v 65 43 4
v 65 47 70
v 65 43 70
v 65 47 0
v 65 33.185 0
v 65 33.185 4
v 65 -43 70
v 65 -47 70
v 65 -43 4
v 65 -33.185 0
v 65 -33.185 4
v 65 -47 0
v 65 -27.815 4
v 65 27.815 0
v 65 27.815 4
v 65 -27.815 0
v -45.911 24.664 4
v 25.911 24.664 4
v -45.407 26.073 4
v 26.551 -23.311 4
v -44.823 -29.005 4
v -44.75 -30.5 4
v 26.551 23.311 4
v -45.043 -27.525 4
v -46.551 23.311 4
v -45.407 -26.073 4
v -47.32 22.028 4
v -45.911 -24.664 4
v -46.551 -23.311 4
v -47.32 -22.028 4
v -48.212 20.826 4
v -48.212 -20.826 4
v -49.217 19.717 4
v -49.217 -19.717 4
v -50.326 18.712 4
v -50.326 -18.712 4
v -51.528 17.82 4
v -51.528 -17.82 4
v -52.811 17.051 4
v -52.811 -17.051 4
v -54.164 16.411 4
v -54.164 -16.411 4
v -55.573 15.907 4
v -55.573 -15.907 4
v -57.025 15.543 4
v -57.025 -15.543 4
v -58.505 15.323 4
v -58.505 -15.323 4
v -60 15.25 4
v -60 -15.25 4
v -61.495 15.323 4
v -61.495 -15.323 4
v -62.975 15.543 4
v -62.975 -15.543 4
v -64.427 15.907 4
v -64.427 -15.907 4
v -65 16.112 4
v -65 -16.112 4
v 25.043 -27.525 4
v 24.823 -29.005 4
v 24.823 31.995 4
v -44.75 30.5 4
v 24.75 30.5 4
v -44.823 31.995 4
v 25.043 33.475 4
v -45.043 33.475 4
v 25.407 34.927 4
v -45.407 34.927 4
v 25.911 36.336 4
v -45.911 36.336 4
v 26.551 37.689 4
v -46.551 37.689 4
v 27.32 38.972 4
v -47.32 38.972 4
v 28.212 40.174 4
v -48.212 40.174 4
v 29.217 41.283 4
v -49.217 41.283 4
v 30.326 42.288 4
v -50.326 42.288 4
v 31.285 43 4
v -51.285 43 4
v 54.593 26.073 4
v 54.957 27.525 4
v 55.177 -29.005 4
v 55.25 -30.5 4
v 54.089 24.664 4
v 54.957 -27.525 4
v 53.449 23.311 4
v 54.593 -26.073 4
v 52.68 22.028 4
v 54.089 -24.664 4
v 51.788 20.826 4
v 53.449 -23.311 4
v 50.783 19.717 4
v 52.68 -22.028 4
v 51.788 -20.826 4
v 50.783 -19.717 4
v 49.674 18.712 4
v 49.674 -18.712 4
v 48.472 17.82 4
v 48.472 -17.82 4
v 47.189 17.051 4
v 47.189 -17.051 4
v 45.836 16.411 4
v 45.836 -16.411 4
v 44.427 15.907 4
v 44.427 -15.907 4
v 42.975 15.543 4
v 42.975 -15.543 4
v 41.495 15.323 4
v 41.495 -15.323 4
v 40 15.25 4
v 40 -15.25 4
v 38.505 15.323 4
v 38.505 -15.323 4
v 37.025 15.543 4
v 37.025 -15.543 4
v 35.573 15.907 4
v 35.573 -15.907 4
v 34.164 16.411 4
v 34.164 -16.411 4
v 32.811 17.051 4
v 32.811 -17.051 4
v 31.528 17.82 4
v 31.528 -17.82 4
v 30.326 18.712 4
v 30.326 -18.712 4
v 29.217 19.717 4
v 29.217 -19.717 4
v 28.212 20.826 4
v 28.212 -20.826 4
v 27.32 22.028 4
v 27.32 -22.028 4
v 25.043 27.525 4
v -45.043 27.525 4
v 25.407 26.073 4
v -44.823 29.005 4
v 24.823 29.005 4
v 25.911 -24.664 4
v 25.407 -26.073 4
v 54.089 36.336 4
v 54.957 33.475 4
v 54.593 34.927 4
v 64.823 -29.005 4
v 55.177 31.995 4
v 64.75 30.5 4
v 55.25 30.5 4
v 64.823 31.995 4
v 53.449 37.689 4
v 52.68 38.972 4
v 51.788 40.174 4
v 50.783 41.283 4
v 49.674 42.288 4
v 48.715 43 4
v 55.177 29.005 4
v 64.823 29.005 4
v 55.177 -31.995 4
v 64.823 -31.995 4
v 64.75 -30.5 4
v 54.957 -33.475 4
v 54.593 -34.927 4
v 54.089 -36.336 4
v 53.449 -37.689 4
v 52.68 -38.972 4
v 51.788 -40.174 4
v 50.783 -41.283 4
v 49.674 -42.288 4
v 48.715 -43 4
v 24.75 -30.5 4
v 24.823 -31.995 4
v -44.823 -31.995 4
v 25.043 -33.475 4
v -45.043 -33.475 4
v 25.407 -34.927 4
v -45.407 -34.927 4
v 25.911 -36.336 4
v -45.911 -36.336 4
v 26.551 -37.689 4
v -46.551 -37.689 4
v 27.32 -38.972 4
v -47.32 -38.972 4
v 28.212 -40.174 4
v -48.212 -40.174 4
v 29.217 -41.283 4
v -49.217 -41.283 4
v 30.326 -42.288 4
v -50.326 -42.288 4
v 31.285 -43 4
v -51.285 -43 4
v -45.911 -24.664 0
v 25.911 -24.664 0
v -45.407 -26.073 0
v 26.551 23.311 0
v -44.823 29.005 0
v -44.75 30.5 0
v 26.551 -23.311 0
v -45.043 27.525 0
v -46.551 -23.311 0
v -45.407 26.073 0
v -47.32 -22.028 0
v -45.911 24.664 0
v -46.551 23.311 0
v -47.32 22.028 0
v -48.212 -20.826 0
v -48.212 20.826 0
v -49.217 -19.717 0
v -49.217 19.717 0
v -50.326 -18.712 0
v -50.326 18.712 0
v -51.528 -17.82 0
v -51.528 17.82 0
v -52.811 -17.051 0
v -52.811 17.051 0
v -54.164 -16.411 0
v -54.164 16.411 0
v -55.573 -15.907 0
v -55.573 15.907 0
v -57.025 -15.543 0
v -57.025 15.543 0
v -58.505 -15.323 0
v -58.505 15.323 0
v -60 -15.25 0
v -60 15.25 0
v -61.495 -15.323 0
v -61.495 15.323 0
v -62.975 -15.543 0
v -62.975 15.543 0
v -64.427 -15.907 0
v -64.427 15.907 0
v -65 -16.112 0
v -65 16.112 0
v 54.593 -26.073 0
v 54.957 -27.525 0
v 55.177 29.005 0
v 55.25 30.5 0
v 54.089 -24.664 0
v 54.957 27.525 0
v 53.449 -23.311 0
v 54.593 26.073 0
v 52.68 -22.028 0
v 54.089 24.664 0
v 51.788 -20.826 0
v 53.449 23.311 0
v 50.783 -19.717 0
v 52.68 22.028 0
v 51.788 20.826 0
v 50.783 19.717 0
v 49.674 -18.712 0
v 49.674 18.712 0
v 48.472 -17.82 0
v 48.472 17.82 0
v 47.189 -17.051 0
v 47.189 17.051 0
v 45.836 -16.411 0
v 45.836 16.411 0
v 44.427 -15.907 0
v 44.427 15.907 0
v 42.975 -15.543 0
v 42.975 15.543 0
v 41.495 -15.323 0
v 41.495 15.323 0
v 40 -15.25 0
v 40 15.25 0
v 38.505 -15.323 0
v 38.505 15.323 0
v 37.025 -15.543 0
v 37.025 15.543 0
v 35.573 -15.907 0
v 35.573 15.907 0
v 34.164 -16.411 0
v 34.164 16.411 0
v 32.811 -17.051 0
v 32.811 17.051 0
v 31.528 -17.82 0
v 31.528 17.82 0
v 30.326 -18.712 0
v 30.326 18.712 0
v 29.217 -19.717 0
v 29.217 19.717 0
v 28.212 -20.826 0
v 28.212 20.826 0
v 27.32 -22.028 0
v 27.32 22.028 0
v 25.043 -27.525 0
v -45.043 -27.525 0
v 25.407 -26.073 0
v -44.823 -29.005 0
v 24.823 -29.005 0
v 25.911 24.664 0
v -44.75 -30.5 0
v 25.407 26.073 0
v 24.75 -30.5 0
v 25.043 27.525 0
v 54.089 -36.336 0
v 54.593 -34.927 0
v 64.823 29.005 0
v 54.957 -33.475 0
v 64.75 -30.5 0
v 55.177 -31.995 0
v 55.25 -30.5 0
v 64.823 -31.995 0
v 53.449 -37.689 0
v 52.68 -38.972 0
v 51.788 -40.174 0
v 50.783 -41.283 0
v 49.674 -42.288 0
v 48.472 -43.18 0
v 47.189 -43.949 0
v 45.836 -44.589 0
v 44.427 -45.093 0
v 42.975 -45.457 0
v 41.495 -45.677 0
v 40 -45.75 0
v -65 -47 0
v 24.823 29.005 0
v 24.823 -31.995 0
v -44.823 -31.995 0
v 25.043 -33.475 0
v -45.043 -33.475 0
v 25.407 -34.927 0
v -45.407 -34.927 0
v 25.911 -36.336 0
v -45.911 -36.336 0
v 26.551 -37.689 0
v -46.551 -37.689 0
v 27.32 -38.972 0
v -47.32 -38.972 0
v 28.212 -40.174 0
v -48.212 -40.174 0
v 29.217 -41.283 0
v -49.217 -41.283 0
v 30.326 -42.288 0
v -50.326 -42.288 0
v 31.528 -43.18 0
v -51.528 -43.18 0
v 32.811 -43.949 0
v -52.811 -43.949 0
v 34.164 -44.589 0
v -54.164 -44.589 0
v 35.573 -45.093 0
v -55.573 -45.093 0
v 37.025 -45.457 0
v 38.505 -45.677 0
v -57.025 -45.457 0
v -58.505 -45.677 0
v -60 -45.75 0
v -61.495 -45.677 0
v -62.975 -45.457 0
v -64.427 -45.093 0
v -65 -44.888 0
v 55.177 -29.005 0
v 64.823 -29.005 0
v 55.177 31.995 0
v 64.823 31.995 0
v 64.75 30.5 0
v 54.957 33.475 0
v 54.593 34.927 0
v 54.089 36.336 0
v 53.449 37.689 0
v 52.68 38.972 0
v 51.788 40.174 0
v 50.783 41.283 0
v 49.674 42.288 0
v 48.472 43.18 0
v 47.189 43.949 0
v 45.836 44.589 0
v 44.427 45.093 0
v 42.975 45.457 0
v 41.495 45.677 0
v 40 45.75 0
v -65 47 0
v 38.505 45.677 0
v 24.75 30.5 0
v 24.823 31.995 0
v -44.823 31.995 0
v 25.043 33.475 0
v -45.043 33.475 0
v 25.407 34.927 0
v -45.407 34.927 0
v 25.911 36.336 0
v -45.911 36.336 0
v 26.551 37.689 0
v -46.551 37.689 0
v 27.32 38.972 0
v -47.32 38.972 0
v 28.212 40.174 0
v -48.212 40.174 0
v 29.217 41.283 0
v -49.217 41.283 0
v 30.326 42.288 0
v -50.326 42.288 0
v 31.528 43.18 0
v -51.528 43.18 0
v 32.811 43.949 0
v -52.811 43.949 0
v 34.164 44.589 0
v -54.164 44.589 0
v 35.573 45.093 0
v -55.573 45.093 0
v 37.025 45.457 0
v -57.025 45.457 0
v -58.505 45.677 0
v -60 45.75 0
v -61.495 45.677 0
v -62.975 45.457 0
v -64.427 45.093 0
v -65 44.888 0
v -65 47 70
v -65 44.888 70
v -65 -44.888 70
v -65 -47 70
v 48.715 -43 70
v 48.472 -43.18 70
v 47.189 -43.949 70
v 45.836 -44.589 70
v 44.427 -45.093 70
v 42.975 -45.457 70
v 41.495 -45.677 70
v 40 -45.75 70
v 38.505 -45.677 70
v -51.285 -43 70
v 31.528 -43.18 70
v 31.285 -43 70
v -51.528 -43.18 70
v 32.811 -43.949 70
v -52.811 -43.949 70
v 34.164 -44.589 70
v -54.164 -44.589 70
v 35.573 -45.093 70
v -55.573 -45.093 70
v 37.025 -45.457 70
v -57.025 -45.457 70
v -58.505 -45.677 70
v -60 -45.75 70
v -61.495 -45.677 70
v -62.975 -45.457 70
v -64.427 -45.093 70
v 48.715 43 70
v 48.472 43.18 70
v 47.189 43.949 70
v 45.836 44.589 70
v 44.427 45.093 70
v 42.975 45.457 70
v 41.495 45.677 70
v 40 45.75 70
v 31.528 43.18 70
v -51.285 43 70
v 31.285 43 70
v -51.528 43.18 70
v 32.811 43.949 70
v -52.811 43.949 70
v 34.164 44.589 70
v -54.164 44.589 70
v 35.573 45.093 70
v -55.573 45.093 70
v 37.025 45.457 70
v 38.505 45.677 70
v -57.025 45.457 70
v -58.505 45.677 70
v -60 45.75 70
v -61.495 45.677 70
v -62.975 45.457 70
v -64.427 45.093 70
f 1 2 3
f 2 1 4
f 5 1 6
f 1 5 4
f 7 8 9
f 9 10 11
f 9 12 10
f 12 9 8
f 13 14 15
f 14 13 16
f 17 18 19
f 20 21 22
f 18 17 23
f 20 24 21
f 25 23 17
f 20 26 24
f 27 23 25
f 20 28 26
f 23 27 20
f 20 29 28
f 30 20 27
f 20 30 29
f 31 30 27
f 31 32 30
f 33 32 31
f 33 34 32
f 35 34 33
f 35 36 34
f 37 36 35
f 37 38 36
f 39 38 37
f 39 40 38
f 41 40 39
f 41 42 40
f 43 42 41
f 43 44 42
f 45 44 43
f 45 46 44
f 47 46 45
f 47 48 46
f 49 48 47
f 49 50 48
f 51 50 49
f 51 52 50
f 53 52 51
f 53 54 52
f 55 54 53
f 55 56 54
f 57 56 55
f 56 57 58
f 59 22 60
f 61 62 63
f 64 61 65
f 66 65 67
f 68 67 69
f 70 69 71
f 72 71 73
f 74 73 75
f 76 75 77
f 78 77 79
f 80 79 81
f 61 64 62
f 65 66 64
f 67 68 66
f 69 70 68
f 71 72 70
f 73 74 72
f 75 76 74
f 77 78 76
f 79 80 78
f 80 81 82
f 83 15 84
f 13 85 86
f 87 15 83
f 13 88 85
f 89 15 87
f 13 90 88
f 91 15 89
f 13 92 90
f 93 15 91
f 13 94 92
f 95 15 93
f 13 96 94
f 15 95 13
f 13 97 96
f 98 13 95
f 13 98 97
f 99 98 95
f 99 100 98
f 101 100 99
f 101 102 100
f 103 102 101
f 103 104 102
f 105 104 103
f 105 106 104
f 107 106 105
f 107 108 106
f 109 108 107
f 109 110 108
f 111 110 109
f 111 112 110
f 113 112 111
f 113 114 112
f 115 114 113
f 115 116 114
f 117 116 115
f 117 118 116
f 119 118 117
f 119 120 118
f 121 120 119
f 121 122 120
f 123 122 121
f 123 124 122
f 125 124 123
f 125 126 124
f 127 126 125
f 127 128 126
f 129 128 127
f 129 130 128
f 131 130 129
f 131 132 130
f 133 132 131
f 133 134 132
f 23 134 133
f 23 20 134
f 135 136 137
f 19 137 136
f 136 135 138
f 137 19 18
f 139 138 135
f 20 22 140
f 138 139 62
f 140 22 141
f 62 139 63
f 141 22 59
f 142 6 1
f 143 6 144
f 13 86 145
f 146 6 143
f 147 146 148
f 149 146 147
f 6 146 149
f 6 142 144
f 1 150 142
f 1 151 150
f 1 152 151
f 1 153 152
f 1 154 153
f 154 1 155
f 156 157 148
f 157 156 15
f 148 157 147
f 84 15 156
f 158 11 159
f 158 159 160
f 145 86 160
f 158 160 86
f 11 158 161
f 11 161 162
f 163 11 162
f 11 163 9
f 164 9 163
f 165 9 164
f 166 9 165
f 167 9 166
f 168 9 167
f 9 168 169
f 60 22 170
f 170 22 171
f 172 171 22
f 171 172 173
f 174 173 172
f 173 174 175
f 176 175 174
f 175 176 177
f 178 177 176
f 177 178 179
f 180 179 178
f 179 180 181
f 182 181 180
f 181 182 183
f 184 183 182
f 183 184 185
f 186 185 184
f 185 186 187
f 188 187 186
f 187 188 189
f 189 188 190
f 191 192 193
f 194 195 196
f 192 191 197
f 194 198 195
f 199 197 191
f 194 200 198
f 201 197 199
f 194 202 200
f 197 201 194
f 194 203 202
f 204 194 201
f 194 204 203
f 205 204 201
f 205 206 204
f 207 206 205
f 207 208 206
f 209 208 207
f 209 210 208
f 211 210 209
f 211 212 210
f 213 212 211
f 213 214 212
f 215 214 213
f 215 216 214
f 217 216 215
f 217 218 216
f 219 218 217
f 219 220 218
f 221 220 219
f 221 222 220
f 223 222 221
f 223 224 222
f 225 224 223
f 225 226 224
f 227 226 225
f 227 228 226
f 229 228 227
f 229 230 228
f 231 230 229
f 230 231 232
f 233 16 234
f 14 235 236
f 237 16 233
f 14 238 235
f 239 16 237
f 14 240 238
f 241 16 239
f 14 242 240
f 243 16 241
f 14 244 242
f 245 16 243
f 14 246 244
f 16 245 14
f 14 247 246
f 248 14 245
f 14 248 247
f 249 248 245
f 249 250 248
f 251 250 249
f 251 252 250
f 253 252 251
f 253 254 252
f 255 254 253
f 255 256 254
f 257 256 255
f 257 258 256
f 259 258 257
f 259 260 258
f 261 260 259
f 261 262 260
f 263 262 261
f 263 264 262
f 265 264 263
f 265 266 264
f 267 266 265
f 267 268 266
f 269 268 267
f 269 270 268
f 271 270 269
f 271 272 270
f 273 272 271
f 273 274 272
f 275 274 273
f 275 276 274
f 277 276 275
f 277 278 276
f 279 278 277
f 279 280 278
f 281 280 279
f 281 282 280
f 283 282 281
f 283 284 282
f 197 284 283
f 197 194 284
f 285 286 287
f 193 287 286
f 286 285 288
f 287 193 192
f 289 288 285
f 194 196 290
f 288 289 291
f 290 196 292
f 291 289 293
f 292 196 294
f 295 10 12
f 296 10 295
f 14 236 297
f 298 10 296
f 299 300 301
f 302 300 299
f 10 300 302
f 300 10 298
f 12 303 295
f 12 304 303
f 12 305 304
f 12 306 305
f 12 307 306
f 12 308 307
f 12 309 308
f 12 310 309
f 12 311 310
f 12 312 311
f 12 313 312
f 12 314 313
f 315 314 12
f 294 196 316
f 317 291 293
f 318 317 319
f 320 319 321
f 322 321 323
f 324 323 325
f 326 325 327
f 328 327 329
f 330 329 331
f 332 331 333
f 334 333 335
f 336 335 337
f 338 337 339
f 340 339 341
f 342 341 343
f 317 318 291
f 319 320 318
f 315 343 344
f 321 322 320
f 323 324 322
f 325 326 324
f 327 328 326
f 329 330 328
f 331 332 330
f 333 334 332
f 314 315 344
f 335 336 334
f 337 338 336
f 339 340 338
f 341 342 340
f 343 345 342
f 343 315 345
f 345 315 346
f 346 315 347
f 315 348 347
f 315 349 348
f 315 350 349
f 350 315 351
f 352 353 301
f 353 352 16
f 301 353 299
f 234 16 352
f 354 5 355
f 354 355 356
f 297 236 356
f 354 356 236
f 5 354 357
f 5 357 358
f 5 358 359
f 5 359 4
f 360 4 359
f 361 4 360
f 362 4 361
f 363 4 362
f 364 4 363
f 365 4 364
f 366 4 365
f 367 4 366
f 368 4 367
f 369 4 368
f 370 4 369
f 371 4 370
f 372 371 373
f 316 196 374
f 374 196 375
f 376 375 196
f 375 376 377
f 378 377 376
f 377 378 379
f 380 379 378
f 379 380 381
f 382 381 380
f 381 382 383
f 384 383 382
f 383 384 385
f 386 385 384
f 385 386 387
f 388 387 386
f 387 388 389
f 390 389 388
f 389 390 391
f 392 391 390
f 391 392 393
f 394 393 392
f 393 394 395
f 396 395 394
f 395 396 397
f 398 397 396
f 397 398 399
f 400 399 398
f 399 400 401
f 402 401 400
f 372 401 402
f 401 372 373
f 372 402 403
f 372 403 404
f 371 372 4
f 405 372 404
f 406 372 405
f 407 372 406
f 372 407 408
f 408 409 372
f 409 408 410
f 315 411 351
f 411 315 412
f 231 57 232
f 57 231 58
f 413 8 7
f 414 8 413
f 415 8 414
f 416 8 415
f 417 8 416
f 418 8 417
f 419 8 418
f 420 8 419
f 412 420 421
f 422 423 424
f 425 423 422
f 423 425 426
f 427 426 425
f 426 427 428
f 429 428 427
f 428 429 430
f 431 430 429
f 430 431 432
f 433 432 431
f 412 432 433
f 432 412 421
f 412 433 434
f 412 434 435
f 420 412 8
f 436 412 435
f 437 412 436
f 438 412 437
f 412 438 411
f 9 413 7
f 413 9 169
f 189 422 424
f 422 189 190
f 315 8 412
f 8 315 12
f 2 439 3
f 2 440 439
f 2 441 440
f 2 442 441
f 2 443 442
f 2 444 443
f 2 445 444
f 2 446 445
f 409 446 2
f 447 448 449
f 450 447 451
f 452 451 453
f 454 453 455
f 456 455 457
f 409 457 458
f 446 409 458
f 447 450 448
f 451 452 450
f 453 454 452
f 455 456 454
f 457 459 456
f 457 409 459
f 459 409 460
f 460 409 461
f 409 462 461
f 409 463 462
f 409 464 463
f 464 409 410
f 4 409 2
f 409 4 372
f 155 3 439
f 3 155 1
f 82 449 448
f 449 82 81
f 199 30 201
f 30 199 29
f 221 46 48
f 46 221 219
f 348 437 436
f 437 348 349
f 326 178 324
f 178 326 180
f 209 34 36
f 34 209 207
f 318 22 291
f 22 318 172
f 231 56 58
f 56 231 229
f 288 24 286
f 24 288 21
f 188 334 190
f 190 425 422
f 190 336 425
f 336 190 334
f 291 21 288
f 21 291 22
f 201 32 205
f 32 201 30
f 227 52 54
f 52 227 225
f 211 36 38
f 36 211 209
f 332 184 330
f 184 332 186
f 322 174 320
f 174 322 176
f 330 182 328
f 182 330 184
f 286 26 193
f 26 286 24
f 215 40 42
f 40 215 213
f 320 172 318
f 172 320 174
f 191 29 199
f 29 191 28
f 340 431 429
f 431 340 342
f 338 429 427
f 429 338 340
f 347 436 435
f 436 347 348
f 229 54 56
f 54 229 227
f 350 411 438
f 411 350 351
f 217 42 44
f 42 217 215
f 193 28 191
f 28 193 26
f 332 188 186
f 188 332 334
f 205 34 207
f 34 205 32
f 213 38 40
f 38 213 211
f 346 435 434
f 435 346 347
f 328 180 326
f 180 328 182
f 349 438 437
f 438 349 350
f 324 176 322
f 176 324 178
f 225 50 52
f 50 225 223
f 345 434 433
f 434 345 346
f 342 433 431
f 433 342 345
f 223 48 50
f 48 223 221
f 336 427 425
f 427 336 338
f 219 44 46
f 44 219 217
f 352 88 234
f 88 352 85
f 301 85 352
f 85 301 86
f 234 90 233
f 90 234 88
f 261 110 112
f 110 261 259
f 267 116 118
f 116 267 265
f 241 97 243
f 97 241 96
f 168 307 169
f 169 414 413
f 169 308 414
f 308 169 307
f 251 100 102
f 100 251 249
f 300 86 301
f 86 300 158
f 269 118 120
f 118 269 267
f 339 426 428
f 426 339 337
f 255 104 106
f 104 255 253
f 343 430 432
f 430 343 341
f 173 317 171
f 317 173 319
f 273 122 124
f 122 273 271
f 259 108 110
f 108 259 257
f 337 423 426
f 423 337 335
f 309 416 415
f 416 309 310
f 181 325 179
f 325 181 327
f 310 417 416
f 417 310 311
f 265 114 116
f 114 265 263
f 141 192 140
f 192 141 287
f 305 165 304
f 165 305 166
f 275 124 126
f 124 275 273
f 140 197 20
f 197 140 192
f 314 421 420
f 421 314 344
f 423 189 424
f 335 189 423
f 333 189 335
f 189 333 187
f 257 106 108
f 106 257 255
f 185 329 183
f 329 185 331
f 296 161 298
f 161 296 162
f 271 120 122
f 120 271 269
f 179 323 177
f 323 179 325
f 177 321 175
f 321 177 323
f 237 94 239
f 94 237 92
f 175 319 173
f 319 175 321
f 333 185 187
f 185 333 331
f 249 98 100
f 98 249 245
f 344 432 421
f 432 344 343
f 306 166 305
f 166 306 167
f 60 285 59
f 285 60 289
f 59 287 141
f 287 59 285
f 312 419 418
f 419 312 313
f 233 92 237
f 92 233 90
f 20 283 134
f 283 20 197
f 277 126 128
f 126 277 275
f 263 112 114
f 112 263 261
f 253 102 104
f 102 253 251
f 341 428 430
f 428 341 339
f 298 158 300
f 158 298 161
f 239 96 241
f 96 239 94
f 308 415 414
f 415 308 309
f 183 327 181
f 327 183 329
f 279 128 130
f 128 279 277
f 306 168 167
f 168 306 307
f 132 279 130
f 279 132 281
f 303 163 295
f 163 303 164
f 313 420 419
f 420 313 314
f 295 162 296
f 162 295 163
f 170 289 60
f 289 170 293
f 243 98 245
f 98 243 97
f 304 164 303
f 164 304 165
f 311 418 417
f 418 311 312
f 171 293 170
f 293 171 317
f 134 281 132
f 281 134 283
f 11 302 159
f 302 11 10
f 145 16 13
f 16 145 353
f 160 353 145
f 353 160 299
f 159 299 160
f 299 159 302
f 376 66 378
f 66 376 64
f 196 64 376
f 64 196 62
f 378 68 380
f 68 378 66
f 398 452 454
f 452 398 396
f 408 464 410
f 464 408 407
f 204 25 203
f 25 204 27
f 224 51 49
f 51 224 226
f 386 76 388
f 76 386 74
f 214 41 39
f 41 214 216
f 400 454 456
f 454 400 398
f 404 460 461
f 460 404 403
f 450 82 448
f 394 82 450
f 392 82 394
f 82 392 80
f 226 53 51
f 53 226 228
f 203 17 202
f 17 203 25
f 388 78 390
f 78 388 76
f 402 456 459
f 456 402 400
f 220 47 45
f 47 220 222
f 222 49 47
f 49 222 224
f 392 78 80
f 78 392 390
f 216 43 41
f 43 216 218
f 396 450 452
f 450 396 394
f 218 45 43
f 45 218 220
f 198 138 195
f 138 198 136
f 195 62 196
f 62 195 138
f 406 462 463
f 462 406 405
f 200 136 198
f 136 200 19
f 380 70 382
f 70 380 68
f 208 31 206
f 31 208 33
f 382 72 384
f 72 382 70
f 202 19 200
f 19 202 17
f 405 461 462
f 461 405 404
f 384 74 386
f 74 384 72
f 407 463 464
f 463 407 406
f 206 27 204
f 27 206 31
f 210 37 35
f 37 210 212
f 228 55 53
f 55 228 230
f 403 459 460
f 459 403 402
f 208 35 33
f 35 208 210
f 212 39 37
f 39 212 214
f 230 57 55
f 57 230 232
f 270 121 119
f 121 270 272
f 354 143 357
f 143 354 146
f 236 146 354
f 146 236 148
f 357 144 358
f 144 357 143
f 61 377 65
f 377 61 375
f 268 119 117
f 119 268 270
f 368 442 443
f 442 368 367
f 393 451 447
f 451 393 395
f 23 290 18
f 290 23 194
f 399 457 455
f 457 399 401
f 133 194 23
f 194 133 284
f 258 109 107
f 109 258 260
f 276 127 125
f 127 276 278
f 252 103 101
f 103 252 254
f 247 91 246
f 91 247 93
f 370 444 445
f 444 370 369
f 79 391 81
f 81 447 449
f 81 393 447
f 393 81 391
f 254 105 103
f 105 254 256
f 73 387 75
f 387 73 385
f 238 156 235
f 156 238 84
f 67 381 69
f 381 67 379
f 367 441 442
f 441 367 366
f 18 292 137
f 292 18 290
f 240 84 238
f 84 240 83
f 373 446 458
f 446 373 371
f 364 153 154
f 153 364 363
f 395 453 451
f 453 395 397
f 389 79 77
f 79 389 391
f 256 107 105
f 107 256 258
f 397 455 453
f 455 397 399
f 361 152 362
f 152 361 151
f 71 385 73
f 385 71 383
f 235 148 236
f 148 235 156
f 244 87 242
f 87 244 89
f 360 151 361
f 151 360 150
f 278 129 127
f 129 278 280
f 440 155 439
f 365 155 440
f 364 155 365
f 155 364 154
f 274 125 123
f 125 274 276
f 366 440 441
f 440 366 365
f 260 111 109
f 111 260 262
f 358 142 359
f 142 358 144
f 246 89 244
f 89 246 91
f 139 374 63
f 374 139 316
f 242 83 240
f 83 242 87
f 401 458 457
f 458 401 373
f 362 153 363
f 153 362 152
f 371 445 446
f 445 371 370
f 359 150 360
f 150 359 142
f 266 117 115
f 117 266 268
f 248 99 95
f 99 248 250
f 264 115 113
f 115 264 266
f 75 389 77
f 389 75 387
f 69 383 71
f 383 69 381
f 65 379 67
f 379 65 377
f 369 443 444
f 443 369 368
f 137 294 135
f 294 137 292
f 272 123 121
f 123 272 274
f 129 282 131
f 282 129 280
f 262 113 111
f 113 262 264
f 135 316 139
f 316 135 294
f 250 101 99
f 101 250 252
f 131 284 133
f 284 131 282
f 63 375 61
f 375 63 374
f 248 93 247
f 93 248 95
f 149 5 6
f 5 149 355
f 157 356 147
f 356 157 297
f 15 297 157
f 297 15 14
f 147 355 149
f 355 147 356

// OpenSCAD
// Built by bench/smallmodels/features/compiler.py from a list of features.
$fn = 64;
difference() {
  union() {
    translate([0, 0, 0]) translate([-65, -45, 0]) cube([130, 90, 4]);
    translate([0, -45, 0]) translate([-65, -2, 0]) cube([130, 4, 70]);
    translate([0, 45, 0]) translate([-65, -2, 0]) cube([130, 4, 70]);
  }
  union() {
    translate([-60, -30.5, -1]) rotate([0, 0, 0]) cylinder(d = 30.5, h = 72);
    translate([40, -30.5, -1]) rotate([0, 0, 0]) cylinder(d = 30.5, h = 72);
    translate([80, -30.5, -1]) rotate([0, 0, 0]) cylinder(d = 30.5, h = 72);
    translate([-60, 30.5, -1]) rotate([0, 0, 0]) cylinder(d = 30.5, h = 72);
    translate([40, 30.5, -1]) rotate([0, 0, 0]) cylinder(d = 30.5, h = 72);
    translate([80, 30.5, -1]) rotate([0, 0, 0]) cylinder(d = 30.5, h = 72);
  }
}
